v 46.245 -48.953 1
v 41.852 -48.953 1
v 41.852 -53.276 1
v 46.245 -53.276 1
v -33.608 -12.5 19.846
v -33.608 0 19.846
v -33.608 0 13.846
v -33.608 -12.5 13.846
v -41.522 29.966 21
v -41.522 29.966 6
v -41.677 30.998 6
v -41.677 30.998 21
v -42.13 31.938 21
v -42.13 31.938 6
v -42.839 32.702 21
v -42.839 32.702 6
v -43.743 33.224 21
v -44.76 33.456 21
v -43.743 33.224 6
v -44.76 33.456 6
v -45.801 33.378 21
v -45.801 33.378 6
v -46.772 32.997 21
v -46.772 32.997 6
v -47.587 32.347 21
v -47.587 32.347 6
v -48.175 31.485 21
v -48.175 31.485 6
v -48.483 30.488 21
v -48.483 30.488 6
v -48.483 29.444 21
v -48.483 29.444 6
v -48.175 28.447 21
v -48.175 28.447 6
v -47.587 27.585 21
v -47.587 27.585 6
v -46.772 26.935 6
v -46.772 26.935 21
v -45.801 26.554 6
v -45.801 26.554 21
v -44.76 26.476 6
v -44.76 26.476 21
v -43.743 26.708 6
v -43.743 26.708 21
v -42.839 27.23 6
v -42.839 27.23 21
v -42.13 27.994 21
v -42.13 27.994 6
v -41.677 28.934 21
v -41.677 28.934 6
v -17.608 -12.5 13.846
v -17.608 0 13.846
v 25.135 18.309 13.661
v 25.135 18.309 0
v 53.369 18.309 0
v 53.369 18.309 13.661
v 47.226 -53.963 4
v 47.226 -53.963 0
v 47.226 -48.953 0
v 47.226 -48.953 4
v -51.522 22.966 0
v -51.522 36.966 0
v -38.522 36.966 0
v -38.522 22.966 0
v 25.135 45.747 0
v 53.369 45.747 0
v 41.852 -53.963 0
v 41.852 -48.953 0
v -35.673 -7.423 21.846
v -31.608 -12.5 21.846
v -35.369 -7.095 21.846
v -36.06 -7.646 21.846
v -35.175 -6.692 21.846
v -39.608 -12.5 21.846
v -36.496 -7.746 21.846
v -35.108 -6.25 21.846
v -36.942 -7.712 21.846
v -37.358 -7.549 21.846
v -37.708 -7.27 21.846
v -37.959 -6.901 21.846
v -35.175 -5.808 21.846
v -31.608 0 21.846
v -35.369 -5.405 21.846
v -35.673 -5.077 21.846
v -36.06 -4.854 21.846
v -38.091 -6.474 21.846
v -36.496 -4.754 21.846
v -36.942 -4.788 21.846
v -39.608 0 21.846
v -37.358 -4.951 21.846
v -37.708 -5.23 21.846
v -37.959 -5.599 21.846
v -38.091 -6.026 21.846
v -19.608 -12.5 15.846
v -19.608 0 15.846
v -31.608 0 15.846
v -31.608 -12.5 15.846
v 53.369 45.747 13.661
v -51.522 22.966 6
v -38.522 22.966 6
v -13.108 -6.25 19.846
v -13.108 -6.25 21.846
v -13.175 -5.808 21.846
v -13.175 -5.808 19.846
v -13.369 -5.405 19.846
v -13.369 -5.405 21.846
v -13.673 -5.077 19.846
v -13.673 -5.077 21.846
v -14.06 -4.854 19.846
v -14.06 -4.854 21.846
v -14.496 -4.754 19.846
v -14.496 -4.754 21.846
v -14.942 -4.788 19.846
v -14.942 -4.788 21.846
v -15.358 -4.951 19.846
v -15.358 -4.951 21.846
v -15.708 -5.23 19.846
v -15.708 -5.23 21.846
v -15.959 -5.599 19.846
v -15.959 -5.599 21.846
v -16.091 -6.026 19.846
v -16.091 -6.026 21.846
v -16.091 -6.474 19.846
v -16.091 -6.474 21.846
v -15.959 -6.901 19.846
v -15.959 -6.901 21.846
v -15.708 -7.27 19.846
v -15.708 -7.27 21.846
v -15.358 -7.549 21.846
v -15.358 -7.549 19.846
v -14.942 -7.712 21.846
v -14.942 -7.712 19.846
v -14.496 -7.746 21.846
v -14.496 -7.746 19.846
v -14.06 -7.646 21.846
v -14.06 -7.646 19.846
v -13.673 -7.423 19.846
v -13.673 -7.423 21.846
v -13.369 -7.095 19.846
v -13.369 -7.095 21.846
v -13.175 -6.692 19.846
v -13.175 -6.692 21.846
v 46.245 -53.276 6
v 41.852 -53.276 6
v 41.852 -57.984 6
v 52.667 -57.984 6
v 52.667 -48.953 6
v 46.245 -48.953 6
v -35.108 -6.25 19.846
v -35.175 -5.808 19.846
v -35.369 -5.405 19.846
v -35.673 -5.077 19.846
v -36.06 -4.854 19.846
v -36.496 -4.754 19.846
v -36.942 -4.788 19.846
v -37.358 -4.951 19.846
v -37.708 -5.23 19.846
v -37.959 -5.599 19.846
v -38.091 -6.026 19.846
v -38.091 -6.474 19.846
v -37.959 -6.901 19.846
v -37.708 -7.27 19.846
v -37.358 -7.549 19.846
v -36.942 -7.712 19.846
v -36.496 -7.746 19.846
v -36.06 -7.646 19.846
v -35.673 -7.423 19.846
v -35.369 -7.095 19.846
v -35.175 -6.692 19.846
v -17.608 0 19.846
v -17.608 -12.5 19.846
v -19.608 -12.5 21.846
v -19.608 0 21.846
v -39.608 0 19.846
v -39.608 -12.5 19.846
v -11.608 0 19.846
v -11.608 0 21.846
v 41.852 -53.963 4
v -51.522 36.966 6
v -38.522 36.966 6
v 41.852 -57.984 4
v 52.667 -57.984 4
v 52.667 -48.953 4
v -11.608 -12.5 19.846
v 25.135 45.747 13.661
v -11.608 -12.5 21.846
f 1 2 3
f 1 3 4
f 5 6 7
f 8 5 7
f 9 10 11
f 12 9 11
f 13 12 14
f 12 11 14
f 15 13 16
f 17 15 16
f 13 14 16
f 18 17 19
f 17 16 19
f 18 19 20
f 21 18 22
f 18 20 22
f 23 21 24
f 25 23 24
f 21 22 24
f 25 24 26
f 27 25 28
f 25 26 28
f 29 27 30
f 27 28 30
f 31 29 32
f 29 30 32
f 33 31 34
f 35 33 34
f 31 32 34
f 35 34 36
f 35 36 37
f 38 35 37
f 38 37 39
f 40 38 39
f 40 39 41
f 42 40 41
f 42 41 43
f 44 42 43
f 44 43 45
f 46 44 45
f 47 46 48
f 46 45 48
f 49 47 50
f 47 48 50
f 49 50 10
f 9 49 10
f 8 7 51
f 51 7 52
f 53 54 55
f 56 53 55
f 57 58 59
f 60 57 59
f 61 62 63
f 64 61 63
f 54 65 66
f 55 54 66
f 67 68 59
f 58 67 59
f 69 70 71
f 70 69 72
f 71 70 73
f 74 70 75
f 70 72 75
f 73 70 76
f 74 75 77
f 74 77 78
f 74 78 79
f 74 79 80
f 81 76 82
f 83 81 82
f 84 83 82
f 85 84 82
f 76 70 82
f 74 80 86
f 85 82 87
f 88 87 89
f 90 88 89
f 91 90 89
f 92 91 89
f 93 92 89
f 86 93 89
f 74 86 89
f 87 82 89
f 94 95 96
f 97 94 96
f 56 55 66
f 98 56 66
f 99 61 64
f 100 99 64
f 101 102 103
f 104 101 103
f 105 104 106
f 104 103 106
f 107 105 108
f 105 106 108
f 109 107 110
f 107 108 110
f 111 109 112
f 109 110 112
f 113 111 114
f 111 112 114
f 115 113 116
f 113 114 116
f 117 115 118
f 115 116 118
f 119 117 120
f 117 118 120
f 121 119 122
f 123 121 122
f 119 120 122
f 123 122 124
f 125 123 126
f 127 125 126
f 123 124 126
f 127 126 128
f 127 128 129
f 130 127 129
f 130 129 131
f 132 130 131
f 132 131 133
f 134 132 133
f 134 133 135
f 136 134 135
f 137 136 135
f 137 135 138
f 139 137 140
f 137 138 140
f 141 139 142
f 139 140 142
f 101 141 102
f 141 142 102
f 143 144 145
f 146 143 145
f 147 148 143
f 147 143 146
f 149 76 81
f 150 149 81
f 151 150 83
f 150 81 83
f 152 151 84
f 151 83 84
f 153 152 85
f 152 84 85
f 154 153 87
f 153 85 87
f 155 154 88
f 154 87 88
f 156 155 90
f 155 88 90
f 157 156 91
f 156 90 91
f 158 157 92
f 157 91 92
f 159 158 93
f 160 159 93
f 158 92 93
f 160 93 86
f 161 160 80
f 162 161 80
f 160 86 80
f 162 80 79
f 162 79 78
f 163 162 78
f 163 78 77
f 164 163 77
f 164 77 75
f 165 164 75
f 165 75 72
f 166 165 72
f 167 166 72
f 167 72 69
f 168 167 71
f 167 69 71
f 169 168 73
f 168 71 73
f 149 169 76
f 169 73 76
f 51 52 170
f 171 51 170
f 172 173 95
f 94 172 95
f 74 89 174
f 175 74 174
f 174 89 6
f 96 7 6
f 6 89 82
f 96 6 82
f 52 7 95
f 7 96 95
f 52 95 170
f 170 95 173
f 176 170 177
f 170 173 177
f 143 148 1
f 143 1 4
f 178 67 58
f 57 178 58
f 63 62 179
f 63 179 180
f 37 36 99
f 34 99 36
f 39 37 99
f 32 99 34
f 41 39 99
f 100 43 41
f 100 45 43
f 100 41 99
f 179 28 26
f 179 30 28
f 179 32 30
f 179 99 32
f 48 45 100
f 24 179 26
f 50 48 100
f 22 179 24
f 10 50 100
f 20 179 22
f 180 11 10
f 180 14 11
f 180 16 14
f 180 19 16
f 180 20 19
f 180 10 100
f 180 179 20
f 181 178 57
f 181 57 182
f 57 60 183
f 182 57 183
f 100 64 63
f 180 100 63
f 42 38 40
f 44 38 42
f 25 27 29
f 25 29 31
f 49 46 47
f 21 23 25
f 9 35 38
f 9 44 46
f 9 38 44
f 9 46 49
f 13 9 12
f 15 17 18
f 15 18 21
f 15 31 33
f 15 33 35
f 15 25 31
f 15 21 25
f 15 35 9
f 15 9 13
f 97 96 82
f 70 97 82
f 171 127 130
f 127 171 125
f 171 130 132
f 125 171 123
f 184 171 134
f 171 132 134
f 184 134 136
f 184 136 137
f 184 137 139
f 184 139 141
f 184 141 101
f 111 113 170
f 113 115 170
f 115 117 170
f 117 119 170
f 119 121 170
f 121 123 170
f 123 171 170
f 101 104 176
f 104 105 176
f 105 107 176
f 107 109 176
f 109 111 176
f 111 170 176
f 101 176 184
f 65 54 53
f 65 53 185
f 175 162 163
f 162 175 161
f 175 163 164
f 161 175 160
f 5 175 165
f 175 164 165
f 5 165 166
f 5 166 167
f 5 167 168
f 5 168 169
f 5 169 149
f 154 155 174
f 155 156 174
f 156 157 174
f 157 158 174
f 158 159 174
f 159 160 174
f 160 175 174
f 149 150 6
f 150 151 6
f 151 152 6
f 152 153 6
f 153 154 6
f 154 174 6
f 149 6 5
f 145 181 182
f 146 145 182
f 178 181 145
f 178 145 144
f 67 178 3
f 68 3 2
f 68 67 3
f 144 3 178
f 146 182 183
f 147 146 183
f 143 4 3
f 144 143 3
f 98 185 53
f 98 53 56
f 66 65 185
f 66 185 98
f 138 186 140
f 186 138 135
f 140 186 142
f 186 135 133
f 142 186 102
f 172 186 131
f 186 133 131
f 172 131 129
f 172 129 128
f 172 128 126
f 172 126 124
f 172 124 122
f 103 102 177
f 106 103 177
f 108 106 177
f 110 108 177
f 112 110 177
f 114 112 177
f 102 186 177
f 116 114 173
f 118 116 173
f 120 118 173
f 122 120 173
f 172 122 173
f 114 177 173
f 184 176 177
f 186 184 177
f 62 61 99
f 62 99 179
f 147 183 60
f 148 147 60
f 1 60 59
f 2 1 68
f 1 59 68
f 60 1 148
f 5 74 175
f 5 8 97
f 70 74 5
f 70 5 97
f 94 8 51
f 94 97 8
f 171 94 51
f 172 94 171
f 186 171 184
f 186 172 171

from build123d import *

# Parameters (mm, degrees)
F1_DEPTH  = 12.5
F3_R      = 1.5
F4_DEPTH  = 2
F5_W      = 13
F5_H      = 14
F6_DEPTH  = 6
F7_R      = 3.5
F8_DEPTH  = 15
F9_W      = 5.374122411
F9_H      = 5.0102584064
F10_DEPTH = 1
F12_DEPTH = 5
F15_DEPTH = 2
F16_W     = 28.2346028835
F16_H     = 27.4385567755
F17_DEPTH = 13.66082


with BuildPart() as f1:
    # F0 (on Front) → F1 (new body)
    with BuildSketch(Plane.XZ):
        Polygon((-19.6080225684, 15.8464666727), (-31.6080225684, 15.8464666727), (-31.6080225684, 21.8464666727), (-39.6080225684, 21.8464666727), (-39.6080225684, 19.8464666727), (-33.6080225684, 19.8464666727), (-33.6080225684, 13.8464666727), (-17.6080225684, 13.8464666727), (-17.6080225684, 19.8464666727), (-11.6080225684, 19.8464666727), (-11.6080225684, 21.8464666727), (-19.6080225684, 21.8464666727), align=None)
    extrude(amount=F1_DEPTH)

    # F3 (on face) → F4 (cut)
    with BuildSketch(Plane.XY.offset(21.8464666727)):
        with Locations((-36.6080225684, -6.25)):
            Circle(F3_R)
        with Locations((-14.6080225684, -6.25)):
            Circle(F3_R)
    extrude(amount=-F4_DEPTH, mode=Mode.SUBTRACT)


with BuildPart() as f6:
    # F5 (on Top) → F6 (new body)
    with BuildSketch(Plane.XY):
        with Locations((-45.0216927001, 29.9660498276)):
            Rectangle(F5_W, F5_H)
    extrude(amount=F6_DEPTH)

    # F7 (on face) → F8 (join)
    with BuildSketch(Plane.XY.offset(6)):
        with Locations((-45.0216927001, 29.9660498276)):
            Circle(F7_R)
    extrude(amount=F8_DEPTH)


with BuildPart() as f10:
    # F9 (on Top) → F10 (new body)
    with BuildSketch(Plane.XY):
        with Locations((44.5387493819, -51.4578428119)):
            Rectangle(F9_W, F9_H)
    extrude(amount=F10_DEPTH)

    # F11 (on face) → F12 (join)
    with BuildSketch(Plane.XY.offset(1)):
        Polygon((47.2258105874, -48.9527136087), (46.2449193001, -48.9527136087), (46.2449193001, -53.2760694623), (41.8516881764, -53.2760694623), (41.8516881764, -53.9629720151), (47.2258105874, -53.9629720151), align=None)
    extrude(amount=F12_DEPTH)

    # F14 (on offset) → F15 (join)
    with BuildSketch(Plane.XY.offset(4)):
        Polygon((52.6665262878, -48.9527136087), (47.2258105874, -48.9527136087), (47.2258105874, -53.9629720151), (41.8516881764, -53.9629720151), (41.8516881764, -57.9841956496), (52.6665262878, -57.9841956496), align=None)
    extrude(amount=F15_DEPTH)


with BuildPart() as f17:
    # F16 (on Top) → F17 (new body)
    with BuildSketch(Plane.XY):
        with Locations((39.2521424219, 32.028012909)):
            Rectangle(F16_W, F16_H)
    extrude(amount=F17_DEPTH)


solid = Compound([f1.part, f6.part, f10.part, f17.part])
